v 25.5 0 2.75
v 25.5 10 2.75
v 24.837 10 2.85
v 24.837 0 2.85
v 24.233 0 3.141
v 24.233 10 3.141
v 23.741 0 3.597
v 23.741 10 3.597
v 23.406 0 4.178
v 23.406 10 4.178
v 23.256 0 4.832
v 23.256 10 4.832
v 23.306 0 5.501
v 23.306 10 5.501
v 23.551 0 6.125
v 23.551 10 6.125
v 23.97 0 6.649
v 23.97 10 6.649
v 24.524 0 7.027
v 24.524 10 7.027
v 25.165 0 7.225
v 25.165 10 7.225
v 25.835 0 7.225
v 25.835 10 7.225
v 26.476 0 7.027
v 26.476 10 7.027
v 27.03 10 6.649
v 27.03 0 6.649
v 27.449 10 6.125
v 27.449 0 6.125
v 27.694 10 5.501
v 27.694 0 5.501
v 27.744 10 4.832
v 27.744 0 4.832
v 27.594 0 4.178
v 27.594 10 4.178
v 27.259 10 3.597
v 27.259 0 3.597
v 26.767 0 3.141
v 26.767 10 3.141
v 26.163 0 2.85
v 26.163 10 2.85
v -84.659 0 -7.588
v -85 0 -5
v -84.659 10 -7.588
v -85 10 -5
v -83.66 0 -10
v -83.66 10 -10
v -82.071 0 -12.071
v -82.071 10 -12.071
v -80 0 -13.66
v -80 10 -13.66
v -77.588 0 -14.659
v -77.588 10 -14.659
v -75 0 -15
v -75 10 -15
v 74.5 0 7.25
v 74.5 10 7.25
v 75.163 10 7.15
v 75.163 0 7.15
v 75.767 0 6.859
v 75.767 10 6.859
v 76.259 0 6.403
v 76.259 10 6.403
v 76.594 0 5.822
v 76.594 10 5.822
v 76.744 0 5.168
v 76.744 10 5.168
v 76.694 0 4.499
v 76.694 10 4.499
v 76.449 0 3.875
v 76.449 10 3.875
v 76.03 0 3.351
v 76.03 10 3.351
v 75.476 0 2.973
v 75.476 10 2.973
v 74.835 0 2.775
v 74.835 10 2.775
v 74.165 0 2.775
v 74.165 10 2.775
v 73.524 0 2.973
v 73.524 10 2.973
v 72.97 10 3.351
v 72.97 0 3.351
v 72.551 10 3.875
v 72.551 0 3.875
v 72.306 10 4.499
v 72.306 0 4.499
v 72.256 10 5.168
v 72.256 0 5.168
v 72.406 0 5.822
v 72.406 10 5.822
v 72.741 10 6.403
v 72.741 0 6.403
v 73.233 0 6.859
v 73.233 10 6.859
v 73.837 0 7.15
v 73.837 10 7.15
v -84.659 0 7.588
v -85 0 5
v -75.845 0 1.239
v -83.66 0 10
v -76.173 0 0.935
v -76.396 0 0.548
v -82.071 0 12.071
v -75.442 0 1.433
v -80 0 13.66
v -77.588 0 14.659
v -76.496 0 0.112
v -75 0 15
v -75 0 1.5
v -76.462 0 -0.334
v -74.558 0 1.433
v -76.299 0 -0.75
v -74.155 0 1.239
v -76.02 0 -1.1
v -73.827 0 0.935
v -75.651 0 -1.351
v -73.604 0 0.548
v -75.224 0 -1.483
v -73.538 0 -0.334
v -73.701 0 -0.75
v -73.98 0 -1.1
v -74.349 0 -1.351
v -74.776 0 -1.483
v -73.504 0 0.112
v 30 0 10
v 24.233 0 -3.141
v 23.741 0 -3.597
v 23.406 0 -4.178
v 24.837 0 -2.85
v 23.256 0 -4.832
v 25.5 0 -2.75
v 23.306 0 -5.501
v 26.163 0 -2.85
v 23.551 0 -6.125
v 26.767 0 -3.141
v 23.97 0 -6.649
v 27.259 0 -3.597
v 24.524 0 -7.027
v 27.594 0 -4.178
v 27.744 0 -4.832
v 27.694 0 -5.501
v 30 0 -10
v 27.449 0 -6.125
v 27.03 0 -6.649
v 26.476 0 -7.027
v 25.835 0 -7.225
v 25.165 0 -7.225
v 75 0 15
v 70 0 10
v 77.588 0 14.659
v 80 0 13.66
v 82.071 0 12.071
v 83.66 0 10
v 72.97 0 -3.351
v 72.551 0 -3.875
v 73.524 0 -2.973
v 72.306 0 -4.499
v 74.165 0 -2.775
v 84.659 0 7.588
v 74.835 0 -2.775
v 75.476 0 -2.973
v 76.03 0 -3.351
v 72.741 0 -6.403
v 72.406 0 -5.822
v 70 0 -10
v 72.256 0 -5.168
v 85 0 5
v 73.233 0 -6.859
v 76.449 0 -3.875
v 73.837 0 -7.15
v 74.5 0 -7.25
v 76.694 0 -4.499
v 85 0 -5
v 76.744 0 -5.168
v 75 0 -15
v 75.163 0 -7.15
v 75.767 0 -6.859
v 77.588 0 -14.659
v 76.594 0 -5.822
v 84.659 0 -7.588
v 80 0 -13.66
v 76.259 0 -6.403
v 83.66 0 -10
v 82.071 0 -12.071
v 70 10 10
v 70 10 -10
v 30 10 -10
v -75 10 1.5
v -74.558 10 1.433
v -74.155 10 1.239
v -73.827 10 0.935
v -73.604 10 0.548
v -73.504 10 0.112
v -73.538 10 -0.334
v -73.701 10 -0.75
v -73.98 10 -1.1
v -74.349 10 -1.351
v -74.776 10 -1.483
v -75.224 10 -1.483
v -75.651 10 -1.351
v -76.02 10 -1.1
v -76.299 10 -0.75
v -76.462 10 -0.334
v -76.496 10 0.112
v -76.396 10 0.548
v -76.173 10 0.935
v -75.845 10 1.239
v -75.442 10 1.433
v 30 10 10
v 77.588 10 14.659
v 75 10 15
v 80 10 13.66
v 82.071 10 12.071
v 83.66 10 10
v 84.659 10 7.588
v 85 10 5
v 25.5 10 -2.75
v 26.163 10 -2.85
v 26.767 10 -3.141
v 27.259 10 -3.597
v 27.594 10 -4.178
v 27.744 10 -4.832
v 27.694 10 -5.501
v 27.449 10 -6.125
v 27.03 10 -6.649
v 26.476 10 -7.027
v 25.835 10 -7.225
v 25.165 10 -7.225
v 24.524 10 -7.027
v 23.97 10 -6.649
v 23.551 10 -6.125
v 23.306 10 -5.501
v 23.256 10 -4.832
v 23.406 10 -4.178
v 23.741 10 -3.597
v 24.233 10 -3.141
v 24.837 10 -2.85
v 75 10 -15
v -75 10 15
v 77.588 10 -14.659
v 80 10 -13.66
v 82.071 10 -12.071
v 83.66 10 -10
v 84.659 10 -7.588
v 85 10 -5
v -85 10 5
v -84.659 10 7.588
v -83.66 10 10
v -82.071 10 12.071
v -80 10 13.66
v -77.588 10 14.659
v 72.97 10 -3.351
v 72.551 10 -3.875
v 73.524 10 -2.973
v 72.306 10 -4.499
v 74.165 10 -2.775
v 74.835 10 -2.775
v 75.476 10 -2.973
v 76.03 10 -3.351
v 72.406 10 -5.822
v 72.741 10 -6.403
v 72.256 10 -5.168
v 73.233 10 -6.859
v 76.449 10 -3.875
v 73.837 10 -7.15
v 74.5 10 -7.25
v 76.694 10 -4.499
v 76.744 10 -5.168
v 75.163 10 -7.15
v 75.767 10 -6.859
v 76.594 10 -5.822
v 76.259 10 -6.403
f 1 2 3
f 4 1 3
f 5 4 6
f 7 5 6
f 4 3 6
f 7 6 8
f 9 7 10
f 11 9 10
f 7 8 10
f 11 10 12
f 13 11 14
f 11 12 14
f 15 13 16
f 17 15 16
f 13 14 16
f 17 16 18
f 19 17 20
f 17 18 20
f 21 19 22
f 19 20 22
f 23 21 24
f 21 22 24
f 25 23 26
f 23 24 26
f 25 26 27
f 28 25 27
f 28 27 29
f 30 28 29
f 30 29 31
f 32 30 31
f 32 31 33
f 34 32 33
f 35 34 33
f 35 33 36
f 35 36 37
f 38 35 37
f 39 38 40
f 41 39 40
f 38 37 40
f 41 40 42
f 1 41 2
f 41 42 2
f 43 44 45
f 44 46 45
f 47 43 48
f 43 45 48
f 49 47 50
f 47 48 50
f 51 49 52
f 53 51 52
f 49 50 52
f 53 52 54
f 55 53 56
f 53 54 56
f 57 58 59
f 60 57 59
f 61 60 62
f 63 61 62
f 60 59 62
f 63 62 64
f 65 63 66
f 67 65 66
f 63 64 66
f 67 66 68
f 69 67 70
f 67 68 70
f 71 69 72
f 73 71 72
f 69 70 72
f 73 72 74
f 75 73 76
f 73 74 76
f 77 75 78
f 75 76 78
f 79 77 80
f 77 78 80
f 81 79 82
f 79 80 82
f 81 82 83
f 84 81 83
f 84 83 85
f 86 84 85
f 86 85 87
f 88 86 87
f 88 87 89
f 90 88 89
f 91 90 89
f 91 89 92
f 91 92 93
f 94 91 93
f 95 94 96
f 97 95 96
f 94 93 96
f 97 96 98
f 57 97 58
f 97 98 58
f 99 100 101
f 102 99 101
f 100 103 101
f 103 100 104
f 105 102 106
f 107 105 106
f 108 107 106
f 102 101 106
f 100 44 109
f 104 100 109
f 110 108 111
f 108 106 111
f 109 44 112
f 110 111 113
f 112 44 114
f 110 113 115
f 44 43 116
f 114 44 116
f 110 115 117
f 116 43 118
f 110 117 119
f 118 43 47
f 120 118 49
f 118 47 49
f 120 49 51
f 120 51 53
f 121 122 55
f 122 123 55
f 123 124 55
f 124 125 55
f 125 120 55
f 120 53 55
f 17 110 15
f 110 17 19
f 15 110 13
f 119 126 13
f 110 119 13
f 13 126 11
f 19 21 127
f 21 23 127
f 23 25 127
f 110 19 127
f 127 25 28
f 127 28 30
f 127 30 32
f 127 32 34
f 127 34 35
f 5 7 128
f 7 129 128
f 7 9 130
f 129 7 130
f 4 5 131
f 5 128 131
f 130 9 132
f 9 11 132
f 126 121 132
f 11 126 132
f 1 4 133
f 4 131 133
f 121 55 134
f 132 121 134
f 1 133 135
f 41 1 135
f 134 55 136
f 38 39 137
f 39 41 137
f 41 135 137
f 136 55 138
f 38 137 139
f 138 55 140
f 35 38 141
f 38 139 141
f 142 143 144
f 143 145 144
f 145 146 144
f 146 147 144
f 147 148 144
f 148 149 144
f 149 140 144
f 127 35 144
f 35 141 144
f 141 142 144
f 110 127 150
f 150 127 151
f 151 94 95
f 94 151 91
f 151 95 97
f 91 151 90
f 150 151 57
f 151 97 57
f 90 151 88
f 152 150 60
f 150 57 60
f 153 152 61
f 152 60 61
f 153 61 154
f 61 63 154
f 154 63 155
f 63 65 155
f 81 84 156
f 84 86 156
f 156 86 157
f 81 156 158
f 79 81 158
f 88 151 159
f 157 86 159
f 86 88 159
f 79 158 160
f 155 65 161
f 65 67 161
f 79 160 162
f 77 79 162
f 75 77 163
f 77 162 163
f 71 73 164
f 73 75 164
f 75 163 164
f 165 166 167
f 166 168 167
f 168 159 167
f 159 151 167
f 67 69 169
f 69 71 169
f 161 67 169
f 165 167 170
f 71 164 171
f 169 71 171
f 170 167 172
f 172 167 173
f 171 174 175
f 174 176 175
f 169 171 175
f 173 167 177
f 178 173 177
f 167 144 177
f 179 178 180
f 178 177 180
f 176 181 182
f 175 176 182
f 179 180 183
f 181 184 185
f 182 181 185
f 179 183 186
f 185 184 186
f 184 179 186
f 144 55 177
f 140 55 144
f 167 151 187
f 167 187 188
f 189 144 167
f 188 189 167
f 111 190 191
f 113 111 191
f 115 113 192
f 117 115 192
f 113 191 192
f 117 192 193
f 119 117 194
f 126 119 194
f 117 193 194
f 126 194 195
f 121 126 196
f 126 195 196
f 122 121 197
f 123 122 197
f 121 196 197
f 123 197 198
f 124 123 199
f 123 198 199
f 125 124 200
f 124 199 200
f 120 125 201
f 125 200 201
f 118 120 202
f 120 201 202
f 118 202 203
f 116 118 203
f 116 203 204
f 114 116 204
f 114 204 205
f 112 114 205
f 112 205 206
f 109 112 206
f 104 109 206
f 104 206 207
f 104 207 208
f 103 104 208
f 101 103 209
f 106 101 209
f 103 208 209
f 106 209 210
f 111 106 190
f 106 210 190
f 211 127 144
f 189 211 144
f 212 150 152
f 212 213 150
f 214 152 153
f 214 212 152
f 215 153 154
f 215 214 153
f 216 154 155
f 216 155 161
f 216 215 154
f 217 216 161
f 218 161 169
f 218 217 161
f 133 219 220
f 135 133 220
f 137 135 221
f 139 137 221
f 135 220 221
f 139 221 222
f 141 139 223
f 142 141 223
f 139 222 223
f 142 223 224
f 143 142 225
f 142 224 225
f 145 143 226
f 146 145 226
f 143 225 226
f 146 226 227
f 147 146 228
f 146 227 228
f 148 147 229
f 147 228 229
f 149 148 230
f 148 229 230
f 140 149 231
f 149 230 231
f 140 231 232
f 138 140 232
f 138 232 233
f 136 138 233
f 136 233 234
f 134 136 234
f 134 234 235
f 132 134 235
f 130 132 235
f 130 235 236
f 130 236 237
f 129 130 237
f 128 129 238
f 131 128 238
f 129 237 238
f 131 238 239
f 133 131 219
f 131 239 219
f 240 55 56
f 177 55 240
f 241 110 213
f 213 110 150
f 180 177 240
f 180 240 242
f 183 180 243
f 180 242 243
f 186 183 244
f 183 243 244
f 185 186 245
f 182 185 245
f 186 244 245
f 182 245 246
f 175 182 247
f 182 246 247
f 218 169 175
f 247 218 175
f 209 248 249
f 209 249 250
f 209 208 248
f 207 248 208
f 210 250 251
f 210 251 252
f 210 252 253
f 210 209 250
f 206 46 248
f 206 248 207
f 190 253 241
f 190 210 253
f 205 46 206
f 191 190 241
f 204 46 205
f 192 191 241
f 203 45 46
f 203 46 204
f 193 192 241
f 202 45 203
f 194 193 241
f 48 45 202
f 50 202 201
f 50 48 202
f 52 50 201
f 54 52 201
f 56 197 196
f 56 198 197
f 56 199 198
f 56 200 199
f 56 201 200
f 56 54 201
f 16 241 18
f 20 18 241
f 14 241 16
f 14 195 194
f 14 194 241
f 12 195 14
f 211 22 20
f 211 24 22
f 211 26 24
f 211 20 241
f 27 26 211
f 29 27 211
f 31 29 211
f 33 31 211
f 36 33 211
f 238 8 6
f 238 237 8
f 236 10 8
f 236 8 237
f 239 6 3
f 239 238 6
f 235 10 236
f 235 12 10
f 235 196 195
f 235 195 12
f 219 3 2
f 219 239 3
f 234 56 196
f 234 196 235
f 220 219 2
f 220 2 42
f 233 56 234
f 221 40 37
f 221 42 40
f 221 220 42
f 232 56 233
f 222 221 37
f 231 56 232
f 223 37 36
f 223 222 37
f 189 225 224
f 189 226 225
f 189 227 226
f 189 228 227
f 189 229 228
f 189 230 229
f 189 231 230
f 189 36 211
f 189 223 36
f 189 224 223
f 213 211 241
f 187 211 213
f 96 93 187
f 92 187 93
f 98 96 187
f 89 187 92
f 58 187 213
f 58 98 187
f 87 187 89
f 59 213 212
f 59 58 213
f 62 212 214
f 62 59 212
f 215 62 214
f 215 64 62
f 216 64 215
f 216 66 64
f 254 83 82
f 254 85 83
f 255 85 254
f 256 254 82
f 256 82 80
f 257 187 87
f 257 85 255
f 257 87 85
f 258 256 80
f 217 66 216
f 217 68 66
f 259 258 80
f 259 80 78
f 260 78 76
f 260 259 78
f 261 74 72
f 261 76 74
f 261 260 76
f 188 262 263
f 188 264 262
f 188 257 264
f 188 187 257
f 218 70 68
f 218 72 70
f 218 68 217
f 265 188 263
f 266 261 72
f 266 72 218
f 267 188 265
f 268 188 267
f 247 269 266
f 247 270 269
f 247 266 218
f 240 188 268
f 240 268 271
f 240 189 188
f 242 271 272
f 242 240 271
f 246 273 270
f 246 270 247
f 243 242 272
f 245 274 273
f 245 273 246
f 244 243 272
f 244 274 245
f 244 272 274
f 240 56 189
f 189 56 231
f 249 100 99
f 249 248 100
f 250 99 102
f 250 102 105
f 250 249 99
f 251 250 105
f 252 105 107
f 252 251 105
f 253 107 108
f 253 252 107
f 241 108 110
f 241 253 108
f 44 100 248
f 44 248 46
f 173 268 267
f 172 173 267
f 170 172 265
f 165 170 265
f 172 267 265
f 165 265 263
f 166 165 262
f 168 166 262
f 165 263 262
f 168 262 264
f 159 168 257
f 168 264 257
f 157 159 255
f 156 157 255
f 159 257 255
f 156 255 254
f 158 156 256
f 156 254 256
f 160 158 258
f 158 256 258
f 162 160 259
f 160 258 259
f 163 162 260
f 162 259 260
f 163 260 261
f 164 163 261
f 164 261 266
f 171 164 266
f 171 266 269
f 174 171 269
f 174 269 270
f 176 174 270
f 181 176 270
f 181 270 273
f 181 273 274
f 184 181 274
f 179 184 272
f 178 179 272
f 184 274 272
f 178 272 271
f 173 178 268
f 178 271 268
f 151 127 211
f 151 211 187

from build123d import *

# Parameters (mm, degrees)
CROQUIS1_W              = 170
CROQUIS1_H              = 30
CROQUIS1_W_2            = 40
CROQUIS1_H_2            = 20
SALIENTE_EXTRUIR1_DEPTH = 10
CROQUIS2_R              = 2.25
CORTAR_EXTRUIR1_DEPTH   = 10
REDONDEO3_R             = 10
CROQUIS3_R              = 1.5
CORTAR_EXTRUIR2_DEPTH   = 10


with BuildPart() as part:
    # Croquis1 → Saliente-Extruir1 (new body)
    with BuildSketch(Plane(origin=(0, 0, 0), x_dir=(1, 0, 0), z_dir=(0, 1, 0))):
        Rectangle(CROQUIS1_W, CROQUIS1_H)
        with Locations((50, 0)):
            Rectangle(CROQUIS1_W_2, CROQUIS1_H_2, mode=Mode.SUBTRACT)
    extrude(amount=SALIENTE_EXTRUIR1_DEPTH)

    # Croquis2 → Cortar-Extruir1 (cut)
    with BuildSketch(Plane(origin=(0, 10, 0), x_dir=(1, 0, 0), z_dir=(0, 1, 0))):
        with Locations(Location((74.5, -5, 0), (0, 0, 270))):
            Circle(CROQUIS2_R)
        with Locations(Location((74.5, 5, 0), (0, 0, 90))):
            Circle(CROQUIS2_R)
        with Locations(Location((25.5, -5, 0), (0, 0, 90))):
            Circle(CROQUIS2_R)
        with Locations(Location((25.5, 5, 0), (0, 0, 270))):
            Circle(CROQUIS2_R)
    extrude(amount=-CORTAR_EXTRUIR1_DEPTH, mode=Mode.SUBTRACT)

    # Redondeo3
    redondeo3_edges = [part.edges().sort_by_distance(p)[0] for p in [
        (-85, 5, -15),
        (85, 5, -15),
        (85, 5, 15),
        (-85, 5, 15),
    ]]
    fillet(redondeo3_edges, radius=REDONDEO3_R)

    # Croquis3 → Cortar-Extruir2 (cut)
    with BuildSketch(Plane(origin=(0, 10, 0), x_dir=(1, 0, 0), z_dir=(0, 1, 0))):
        with Locations(Location((-75, 0, 0), (0, 0, 270))):
            Circle(CROQUIS3_R)
    extrude(amount=-CORTAR_EXTRUIR2_DEPTH, mode=Mode.SUBTRACT)


solid = part.part
